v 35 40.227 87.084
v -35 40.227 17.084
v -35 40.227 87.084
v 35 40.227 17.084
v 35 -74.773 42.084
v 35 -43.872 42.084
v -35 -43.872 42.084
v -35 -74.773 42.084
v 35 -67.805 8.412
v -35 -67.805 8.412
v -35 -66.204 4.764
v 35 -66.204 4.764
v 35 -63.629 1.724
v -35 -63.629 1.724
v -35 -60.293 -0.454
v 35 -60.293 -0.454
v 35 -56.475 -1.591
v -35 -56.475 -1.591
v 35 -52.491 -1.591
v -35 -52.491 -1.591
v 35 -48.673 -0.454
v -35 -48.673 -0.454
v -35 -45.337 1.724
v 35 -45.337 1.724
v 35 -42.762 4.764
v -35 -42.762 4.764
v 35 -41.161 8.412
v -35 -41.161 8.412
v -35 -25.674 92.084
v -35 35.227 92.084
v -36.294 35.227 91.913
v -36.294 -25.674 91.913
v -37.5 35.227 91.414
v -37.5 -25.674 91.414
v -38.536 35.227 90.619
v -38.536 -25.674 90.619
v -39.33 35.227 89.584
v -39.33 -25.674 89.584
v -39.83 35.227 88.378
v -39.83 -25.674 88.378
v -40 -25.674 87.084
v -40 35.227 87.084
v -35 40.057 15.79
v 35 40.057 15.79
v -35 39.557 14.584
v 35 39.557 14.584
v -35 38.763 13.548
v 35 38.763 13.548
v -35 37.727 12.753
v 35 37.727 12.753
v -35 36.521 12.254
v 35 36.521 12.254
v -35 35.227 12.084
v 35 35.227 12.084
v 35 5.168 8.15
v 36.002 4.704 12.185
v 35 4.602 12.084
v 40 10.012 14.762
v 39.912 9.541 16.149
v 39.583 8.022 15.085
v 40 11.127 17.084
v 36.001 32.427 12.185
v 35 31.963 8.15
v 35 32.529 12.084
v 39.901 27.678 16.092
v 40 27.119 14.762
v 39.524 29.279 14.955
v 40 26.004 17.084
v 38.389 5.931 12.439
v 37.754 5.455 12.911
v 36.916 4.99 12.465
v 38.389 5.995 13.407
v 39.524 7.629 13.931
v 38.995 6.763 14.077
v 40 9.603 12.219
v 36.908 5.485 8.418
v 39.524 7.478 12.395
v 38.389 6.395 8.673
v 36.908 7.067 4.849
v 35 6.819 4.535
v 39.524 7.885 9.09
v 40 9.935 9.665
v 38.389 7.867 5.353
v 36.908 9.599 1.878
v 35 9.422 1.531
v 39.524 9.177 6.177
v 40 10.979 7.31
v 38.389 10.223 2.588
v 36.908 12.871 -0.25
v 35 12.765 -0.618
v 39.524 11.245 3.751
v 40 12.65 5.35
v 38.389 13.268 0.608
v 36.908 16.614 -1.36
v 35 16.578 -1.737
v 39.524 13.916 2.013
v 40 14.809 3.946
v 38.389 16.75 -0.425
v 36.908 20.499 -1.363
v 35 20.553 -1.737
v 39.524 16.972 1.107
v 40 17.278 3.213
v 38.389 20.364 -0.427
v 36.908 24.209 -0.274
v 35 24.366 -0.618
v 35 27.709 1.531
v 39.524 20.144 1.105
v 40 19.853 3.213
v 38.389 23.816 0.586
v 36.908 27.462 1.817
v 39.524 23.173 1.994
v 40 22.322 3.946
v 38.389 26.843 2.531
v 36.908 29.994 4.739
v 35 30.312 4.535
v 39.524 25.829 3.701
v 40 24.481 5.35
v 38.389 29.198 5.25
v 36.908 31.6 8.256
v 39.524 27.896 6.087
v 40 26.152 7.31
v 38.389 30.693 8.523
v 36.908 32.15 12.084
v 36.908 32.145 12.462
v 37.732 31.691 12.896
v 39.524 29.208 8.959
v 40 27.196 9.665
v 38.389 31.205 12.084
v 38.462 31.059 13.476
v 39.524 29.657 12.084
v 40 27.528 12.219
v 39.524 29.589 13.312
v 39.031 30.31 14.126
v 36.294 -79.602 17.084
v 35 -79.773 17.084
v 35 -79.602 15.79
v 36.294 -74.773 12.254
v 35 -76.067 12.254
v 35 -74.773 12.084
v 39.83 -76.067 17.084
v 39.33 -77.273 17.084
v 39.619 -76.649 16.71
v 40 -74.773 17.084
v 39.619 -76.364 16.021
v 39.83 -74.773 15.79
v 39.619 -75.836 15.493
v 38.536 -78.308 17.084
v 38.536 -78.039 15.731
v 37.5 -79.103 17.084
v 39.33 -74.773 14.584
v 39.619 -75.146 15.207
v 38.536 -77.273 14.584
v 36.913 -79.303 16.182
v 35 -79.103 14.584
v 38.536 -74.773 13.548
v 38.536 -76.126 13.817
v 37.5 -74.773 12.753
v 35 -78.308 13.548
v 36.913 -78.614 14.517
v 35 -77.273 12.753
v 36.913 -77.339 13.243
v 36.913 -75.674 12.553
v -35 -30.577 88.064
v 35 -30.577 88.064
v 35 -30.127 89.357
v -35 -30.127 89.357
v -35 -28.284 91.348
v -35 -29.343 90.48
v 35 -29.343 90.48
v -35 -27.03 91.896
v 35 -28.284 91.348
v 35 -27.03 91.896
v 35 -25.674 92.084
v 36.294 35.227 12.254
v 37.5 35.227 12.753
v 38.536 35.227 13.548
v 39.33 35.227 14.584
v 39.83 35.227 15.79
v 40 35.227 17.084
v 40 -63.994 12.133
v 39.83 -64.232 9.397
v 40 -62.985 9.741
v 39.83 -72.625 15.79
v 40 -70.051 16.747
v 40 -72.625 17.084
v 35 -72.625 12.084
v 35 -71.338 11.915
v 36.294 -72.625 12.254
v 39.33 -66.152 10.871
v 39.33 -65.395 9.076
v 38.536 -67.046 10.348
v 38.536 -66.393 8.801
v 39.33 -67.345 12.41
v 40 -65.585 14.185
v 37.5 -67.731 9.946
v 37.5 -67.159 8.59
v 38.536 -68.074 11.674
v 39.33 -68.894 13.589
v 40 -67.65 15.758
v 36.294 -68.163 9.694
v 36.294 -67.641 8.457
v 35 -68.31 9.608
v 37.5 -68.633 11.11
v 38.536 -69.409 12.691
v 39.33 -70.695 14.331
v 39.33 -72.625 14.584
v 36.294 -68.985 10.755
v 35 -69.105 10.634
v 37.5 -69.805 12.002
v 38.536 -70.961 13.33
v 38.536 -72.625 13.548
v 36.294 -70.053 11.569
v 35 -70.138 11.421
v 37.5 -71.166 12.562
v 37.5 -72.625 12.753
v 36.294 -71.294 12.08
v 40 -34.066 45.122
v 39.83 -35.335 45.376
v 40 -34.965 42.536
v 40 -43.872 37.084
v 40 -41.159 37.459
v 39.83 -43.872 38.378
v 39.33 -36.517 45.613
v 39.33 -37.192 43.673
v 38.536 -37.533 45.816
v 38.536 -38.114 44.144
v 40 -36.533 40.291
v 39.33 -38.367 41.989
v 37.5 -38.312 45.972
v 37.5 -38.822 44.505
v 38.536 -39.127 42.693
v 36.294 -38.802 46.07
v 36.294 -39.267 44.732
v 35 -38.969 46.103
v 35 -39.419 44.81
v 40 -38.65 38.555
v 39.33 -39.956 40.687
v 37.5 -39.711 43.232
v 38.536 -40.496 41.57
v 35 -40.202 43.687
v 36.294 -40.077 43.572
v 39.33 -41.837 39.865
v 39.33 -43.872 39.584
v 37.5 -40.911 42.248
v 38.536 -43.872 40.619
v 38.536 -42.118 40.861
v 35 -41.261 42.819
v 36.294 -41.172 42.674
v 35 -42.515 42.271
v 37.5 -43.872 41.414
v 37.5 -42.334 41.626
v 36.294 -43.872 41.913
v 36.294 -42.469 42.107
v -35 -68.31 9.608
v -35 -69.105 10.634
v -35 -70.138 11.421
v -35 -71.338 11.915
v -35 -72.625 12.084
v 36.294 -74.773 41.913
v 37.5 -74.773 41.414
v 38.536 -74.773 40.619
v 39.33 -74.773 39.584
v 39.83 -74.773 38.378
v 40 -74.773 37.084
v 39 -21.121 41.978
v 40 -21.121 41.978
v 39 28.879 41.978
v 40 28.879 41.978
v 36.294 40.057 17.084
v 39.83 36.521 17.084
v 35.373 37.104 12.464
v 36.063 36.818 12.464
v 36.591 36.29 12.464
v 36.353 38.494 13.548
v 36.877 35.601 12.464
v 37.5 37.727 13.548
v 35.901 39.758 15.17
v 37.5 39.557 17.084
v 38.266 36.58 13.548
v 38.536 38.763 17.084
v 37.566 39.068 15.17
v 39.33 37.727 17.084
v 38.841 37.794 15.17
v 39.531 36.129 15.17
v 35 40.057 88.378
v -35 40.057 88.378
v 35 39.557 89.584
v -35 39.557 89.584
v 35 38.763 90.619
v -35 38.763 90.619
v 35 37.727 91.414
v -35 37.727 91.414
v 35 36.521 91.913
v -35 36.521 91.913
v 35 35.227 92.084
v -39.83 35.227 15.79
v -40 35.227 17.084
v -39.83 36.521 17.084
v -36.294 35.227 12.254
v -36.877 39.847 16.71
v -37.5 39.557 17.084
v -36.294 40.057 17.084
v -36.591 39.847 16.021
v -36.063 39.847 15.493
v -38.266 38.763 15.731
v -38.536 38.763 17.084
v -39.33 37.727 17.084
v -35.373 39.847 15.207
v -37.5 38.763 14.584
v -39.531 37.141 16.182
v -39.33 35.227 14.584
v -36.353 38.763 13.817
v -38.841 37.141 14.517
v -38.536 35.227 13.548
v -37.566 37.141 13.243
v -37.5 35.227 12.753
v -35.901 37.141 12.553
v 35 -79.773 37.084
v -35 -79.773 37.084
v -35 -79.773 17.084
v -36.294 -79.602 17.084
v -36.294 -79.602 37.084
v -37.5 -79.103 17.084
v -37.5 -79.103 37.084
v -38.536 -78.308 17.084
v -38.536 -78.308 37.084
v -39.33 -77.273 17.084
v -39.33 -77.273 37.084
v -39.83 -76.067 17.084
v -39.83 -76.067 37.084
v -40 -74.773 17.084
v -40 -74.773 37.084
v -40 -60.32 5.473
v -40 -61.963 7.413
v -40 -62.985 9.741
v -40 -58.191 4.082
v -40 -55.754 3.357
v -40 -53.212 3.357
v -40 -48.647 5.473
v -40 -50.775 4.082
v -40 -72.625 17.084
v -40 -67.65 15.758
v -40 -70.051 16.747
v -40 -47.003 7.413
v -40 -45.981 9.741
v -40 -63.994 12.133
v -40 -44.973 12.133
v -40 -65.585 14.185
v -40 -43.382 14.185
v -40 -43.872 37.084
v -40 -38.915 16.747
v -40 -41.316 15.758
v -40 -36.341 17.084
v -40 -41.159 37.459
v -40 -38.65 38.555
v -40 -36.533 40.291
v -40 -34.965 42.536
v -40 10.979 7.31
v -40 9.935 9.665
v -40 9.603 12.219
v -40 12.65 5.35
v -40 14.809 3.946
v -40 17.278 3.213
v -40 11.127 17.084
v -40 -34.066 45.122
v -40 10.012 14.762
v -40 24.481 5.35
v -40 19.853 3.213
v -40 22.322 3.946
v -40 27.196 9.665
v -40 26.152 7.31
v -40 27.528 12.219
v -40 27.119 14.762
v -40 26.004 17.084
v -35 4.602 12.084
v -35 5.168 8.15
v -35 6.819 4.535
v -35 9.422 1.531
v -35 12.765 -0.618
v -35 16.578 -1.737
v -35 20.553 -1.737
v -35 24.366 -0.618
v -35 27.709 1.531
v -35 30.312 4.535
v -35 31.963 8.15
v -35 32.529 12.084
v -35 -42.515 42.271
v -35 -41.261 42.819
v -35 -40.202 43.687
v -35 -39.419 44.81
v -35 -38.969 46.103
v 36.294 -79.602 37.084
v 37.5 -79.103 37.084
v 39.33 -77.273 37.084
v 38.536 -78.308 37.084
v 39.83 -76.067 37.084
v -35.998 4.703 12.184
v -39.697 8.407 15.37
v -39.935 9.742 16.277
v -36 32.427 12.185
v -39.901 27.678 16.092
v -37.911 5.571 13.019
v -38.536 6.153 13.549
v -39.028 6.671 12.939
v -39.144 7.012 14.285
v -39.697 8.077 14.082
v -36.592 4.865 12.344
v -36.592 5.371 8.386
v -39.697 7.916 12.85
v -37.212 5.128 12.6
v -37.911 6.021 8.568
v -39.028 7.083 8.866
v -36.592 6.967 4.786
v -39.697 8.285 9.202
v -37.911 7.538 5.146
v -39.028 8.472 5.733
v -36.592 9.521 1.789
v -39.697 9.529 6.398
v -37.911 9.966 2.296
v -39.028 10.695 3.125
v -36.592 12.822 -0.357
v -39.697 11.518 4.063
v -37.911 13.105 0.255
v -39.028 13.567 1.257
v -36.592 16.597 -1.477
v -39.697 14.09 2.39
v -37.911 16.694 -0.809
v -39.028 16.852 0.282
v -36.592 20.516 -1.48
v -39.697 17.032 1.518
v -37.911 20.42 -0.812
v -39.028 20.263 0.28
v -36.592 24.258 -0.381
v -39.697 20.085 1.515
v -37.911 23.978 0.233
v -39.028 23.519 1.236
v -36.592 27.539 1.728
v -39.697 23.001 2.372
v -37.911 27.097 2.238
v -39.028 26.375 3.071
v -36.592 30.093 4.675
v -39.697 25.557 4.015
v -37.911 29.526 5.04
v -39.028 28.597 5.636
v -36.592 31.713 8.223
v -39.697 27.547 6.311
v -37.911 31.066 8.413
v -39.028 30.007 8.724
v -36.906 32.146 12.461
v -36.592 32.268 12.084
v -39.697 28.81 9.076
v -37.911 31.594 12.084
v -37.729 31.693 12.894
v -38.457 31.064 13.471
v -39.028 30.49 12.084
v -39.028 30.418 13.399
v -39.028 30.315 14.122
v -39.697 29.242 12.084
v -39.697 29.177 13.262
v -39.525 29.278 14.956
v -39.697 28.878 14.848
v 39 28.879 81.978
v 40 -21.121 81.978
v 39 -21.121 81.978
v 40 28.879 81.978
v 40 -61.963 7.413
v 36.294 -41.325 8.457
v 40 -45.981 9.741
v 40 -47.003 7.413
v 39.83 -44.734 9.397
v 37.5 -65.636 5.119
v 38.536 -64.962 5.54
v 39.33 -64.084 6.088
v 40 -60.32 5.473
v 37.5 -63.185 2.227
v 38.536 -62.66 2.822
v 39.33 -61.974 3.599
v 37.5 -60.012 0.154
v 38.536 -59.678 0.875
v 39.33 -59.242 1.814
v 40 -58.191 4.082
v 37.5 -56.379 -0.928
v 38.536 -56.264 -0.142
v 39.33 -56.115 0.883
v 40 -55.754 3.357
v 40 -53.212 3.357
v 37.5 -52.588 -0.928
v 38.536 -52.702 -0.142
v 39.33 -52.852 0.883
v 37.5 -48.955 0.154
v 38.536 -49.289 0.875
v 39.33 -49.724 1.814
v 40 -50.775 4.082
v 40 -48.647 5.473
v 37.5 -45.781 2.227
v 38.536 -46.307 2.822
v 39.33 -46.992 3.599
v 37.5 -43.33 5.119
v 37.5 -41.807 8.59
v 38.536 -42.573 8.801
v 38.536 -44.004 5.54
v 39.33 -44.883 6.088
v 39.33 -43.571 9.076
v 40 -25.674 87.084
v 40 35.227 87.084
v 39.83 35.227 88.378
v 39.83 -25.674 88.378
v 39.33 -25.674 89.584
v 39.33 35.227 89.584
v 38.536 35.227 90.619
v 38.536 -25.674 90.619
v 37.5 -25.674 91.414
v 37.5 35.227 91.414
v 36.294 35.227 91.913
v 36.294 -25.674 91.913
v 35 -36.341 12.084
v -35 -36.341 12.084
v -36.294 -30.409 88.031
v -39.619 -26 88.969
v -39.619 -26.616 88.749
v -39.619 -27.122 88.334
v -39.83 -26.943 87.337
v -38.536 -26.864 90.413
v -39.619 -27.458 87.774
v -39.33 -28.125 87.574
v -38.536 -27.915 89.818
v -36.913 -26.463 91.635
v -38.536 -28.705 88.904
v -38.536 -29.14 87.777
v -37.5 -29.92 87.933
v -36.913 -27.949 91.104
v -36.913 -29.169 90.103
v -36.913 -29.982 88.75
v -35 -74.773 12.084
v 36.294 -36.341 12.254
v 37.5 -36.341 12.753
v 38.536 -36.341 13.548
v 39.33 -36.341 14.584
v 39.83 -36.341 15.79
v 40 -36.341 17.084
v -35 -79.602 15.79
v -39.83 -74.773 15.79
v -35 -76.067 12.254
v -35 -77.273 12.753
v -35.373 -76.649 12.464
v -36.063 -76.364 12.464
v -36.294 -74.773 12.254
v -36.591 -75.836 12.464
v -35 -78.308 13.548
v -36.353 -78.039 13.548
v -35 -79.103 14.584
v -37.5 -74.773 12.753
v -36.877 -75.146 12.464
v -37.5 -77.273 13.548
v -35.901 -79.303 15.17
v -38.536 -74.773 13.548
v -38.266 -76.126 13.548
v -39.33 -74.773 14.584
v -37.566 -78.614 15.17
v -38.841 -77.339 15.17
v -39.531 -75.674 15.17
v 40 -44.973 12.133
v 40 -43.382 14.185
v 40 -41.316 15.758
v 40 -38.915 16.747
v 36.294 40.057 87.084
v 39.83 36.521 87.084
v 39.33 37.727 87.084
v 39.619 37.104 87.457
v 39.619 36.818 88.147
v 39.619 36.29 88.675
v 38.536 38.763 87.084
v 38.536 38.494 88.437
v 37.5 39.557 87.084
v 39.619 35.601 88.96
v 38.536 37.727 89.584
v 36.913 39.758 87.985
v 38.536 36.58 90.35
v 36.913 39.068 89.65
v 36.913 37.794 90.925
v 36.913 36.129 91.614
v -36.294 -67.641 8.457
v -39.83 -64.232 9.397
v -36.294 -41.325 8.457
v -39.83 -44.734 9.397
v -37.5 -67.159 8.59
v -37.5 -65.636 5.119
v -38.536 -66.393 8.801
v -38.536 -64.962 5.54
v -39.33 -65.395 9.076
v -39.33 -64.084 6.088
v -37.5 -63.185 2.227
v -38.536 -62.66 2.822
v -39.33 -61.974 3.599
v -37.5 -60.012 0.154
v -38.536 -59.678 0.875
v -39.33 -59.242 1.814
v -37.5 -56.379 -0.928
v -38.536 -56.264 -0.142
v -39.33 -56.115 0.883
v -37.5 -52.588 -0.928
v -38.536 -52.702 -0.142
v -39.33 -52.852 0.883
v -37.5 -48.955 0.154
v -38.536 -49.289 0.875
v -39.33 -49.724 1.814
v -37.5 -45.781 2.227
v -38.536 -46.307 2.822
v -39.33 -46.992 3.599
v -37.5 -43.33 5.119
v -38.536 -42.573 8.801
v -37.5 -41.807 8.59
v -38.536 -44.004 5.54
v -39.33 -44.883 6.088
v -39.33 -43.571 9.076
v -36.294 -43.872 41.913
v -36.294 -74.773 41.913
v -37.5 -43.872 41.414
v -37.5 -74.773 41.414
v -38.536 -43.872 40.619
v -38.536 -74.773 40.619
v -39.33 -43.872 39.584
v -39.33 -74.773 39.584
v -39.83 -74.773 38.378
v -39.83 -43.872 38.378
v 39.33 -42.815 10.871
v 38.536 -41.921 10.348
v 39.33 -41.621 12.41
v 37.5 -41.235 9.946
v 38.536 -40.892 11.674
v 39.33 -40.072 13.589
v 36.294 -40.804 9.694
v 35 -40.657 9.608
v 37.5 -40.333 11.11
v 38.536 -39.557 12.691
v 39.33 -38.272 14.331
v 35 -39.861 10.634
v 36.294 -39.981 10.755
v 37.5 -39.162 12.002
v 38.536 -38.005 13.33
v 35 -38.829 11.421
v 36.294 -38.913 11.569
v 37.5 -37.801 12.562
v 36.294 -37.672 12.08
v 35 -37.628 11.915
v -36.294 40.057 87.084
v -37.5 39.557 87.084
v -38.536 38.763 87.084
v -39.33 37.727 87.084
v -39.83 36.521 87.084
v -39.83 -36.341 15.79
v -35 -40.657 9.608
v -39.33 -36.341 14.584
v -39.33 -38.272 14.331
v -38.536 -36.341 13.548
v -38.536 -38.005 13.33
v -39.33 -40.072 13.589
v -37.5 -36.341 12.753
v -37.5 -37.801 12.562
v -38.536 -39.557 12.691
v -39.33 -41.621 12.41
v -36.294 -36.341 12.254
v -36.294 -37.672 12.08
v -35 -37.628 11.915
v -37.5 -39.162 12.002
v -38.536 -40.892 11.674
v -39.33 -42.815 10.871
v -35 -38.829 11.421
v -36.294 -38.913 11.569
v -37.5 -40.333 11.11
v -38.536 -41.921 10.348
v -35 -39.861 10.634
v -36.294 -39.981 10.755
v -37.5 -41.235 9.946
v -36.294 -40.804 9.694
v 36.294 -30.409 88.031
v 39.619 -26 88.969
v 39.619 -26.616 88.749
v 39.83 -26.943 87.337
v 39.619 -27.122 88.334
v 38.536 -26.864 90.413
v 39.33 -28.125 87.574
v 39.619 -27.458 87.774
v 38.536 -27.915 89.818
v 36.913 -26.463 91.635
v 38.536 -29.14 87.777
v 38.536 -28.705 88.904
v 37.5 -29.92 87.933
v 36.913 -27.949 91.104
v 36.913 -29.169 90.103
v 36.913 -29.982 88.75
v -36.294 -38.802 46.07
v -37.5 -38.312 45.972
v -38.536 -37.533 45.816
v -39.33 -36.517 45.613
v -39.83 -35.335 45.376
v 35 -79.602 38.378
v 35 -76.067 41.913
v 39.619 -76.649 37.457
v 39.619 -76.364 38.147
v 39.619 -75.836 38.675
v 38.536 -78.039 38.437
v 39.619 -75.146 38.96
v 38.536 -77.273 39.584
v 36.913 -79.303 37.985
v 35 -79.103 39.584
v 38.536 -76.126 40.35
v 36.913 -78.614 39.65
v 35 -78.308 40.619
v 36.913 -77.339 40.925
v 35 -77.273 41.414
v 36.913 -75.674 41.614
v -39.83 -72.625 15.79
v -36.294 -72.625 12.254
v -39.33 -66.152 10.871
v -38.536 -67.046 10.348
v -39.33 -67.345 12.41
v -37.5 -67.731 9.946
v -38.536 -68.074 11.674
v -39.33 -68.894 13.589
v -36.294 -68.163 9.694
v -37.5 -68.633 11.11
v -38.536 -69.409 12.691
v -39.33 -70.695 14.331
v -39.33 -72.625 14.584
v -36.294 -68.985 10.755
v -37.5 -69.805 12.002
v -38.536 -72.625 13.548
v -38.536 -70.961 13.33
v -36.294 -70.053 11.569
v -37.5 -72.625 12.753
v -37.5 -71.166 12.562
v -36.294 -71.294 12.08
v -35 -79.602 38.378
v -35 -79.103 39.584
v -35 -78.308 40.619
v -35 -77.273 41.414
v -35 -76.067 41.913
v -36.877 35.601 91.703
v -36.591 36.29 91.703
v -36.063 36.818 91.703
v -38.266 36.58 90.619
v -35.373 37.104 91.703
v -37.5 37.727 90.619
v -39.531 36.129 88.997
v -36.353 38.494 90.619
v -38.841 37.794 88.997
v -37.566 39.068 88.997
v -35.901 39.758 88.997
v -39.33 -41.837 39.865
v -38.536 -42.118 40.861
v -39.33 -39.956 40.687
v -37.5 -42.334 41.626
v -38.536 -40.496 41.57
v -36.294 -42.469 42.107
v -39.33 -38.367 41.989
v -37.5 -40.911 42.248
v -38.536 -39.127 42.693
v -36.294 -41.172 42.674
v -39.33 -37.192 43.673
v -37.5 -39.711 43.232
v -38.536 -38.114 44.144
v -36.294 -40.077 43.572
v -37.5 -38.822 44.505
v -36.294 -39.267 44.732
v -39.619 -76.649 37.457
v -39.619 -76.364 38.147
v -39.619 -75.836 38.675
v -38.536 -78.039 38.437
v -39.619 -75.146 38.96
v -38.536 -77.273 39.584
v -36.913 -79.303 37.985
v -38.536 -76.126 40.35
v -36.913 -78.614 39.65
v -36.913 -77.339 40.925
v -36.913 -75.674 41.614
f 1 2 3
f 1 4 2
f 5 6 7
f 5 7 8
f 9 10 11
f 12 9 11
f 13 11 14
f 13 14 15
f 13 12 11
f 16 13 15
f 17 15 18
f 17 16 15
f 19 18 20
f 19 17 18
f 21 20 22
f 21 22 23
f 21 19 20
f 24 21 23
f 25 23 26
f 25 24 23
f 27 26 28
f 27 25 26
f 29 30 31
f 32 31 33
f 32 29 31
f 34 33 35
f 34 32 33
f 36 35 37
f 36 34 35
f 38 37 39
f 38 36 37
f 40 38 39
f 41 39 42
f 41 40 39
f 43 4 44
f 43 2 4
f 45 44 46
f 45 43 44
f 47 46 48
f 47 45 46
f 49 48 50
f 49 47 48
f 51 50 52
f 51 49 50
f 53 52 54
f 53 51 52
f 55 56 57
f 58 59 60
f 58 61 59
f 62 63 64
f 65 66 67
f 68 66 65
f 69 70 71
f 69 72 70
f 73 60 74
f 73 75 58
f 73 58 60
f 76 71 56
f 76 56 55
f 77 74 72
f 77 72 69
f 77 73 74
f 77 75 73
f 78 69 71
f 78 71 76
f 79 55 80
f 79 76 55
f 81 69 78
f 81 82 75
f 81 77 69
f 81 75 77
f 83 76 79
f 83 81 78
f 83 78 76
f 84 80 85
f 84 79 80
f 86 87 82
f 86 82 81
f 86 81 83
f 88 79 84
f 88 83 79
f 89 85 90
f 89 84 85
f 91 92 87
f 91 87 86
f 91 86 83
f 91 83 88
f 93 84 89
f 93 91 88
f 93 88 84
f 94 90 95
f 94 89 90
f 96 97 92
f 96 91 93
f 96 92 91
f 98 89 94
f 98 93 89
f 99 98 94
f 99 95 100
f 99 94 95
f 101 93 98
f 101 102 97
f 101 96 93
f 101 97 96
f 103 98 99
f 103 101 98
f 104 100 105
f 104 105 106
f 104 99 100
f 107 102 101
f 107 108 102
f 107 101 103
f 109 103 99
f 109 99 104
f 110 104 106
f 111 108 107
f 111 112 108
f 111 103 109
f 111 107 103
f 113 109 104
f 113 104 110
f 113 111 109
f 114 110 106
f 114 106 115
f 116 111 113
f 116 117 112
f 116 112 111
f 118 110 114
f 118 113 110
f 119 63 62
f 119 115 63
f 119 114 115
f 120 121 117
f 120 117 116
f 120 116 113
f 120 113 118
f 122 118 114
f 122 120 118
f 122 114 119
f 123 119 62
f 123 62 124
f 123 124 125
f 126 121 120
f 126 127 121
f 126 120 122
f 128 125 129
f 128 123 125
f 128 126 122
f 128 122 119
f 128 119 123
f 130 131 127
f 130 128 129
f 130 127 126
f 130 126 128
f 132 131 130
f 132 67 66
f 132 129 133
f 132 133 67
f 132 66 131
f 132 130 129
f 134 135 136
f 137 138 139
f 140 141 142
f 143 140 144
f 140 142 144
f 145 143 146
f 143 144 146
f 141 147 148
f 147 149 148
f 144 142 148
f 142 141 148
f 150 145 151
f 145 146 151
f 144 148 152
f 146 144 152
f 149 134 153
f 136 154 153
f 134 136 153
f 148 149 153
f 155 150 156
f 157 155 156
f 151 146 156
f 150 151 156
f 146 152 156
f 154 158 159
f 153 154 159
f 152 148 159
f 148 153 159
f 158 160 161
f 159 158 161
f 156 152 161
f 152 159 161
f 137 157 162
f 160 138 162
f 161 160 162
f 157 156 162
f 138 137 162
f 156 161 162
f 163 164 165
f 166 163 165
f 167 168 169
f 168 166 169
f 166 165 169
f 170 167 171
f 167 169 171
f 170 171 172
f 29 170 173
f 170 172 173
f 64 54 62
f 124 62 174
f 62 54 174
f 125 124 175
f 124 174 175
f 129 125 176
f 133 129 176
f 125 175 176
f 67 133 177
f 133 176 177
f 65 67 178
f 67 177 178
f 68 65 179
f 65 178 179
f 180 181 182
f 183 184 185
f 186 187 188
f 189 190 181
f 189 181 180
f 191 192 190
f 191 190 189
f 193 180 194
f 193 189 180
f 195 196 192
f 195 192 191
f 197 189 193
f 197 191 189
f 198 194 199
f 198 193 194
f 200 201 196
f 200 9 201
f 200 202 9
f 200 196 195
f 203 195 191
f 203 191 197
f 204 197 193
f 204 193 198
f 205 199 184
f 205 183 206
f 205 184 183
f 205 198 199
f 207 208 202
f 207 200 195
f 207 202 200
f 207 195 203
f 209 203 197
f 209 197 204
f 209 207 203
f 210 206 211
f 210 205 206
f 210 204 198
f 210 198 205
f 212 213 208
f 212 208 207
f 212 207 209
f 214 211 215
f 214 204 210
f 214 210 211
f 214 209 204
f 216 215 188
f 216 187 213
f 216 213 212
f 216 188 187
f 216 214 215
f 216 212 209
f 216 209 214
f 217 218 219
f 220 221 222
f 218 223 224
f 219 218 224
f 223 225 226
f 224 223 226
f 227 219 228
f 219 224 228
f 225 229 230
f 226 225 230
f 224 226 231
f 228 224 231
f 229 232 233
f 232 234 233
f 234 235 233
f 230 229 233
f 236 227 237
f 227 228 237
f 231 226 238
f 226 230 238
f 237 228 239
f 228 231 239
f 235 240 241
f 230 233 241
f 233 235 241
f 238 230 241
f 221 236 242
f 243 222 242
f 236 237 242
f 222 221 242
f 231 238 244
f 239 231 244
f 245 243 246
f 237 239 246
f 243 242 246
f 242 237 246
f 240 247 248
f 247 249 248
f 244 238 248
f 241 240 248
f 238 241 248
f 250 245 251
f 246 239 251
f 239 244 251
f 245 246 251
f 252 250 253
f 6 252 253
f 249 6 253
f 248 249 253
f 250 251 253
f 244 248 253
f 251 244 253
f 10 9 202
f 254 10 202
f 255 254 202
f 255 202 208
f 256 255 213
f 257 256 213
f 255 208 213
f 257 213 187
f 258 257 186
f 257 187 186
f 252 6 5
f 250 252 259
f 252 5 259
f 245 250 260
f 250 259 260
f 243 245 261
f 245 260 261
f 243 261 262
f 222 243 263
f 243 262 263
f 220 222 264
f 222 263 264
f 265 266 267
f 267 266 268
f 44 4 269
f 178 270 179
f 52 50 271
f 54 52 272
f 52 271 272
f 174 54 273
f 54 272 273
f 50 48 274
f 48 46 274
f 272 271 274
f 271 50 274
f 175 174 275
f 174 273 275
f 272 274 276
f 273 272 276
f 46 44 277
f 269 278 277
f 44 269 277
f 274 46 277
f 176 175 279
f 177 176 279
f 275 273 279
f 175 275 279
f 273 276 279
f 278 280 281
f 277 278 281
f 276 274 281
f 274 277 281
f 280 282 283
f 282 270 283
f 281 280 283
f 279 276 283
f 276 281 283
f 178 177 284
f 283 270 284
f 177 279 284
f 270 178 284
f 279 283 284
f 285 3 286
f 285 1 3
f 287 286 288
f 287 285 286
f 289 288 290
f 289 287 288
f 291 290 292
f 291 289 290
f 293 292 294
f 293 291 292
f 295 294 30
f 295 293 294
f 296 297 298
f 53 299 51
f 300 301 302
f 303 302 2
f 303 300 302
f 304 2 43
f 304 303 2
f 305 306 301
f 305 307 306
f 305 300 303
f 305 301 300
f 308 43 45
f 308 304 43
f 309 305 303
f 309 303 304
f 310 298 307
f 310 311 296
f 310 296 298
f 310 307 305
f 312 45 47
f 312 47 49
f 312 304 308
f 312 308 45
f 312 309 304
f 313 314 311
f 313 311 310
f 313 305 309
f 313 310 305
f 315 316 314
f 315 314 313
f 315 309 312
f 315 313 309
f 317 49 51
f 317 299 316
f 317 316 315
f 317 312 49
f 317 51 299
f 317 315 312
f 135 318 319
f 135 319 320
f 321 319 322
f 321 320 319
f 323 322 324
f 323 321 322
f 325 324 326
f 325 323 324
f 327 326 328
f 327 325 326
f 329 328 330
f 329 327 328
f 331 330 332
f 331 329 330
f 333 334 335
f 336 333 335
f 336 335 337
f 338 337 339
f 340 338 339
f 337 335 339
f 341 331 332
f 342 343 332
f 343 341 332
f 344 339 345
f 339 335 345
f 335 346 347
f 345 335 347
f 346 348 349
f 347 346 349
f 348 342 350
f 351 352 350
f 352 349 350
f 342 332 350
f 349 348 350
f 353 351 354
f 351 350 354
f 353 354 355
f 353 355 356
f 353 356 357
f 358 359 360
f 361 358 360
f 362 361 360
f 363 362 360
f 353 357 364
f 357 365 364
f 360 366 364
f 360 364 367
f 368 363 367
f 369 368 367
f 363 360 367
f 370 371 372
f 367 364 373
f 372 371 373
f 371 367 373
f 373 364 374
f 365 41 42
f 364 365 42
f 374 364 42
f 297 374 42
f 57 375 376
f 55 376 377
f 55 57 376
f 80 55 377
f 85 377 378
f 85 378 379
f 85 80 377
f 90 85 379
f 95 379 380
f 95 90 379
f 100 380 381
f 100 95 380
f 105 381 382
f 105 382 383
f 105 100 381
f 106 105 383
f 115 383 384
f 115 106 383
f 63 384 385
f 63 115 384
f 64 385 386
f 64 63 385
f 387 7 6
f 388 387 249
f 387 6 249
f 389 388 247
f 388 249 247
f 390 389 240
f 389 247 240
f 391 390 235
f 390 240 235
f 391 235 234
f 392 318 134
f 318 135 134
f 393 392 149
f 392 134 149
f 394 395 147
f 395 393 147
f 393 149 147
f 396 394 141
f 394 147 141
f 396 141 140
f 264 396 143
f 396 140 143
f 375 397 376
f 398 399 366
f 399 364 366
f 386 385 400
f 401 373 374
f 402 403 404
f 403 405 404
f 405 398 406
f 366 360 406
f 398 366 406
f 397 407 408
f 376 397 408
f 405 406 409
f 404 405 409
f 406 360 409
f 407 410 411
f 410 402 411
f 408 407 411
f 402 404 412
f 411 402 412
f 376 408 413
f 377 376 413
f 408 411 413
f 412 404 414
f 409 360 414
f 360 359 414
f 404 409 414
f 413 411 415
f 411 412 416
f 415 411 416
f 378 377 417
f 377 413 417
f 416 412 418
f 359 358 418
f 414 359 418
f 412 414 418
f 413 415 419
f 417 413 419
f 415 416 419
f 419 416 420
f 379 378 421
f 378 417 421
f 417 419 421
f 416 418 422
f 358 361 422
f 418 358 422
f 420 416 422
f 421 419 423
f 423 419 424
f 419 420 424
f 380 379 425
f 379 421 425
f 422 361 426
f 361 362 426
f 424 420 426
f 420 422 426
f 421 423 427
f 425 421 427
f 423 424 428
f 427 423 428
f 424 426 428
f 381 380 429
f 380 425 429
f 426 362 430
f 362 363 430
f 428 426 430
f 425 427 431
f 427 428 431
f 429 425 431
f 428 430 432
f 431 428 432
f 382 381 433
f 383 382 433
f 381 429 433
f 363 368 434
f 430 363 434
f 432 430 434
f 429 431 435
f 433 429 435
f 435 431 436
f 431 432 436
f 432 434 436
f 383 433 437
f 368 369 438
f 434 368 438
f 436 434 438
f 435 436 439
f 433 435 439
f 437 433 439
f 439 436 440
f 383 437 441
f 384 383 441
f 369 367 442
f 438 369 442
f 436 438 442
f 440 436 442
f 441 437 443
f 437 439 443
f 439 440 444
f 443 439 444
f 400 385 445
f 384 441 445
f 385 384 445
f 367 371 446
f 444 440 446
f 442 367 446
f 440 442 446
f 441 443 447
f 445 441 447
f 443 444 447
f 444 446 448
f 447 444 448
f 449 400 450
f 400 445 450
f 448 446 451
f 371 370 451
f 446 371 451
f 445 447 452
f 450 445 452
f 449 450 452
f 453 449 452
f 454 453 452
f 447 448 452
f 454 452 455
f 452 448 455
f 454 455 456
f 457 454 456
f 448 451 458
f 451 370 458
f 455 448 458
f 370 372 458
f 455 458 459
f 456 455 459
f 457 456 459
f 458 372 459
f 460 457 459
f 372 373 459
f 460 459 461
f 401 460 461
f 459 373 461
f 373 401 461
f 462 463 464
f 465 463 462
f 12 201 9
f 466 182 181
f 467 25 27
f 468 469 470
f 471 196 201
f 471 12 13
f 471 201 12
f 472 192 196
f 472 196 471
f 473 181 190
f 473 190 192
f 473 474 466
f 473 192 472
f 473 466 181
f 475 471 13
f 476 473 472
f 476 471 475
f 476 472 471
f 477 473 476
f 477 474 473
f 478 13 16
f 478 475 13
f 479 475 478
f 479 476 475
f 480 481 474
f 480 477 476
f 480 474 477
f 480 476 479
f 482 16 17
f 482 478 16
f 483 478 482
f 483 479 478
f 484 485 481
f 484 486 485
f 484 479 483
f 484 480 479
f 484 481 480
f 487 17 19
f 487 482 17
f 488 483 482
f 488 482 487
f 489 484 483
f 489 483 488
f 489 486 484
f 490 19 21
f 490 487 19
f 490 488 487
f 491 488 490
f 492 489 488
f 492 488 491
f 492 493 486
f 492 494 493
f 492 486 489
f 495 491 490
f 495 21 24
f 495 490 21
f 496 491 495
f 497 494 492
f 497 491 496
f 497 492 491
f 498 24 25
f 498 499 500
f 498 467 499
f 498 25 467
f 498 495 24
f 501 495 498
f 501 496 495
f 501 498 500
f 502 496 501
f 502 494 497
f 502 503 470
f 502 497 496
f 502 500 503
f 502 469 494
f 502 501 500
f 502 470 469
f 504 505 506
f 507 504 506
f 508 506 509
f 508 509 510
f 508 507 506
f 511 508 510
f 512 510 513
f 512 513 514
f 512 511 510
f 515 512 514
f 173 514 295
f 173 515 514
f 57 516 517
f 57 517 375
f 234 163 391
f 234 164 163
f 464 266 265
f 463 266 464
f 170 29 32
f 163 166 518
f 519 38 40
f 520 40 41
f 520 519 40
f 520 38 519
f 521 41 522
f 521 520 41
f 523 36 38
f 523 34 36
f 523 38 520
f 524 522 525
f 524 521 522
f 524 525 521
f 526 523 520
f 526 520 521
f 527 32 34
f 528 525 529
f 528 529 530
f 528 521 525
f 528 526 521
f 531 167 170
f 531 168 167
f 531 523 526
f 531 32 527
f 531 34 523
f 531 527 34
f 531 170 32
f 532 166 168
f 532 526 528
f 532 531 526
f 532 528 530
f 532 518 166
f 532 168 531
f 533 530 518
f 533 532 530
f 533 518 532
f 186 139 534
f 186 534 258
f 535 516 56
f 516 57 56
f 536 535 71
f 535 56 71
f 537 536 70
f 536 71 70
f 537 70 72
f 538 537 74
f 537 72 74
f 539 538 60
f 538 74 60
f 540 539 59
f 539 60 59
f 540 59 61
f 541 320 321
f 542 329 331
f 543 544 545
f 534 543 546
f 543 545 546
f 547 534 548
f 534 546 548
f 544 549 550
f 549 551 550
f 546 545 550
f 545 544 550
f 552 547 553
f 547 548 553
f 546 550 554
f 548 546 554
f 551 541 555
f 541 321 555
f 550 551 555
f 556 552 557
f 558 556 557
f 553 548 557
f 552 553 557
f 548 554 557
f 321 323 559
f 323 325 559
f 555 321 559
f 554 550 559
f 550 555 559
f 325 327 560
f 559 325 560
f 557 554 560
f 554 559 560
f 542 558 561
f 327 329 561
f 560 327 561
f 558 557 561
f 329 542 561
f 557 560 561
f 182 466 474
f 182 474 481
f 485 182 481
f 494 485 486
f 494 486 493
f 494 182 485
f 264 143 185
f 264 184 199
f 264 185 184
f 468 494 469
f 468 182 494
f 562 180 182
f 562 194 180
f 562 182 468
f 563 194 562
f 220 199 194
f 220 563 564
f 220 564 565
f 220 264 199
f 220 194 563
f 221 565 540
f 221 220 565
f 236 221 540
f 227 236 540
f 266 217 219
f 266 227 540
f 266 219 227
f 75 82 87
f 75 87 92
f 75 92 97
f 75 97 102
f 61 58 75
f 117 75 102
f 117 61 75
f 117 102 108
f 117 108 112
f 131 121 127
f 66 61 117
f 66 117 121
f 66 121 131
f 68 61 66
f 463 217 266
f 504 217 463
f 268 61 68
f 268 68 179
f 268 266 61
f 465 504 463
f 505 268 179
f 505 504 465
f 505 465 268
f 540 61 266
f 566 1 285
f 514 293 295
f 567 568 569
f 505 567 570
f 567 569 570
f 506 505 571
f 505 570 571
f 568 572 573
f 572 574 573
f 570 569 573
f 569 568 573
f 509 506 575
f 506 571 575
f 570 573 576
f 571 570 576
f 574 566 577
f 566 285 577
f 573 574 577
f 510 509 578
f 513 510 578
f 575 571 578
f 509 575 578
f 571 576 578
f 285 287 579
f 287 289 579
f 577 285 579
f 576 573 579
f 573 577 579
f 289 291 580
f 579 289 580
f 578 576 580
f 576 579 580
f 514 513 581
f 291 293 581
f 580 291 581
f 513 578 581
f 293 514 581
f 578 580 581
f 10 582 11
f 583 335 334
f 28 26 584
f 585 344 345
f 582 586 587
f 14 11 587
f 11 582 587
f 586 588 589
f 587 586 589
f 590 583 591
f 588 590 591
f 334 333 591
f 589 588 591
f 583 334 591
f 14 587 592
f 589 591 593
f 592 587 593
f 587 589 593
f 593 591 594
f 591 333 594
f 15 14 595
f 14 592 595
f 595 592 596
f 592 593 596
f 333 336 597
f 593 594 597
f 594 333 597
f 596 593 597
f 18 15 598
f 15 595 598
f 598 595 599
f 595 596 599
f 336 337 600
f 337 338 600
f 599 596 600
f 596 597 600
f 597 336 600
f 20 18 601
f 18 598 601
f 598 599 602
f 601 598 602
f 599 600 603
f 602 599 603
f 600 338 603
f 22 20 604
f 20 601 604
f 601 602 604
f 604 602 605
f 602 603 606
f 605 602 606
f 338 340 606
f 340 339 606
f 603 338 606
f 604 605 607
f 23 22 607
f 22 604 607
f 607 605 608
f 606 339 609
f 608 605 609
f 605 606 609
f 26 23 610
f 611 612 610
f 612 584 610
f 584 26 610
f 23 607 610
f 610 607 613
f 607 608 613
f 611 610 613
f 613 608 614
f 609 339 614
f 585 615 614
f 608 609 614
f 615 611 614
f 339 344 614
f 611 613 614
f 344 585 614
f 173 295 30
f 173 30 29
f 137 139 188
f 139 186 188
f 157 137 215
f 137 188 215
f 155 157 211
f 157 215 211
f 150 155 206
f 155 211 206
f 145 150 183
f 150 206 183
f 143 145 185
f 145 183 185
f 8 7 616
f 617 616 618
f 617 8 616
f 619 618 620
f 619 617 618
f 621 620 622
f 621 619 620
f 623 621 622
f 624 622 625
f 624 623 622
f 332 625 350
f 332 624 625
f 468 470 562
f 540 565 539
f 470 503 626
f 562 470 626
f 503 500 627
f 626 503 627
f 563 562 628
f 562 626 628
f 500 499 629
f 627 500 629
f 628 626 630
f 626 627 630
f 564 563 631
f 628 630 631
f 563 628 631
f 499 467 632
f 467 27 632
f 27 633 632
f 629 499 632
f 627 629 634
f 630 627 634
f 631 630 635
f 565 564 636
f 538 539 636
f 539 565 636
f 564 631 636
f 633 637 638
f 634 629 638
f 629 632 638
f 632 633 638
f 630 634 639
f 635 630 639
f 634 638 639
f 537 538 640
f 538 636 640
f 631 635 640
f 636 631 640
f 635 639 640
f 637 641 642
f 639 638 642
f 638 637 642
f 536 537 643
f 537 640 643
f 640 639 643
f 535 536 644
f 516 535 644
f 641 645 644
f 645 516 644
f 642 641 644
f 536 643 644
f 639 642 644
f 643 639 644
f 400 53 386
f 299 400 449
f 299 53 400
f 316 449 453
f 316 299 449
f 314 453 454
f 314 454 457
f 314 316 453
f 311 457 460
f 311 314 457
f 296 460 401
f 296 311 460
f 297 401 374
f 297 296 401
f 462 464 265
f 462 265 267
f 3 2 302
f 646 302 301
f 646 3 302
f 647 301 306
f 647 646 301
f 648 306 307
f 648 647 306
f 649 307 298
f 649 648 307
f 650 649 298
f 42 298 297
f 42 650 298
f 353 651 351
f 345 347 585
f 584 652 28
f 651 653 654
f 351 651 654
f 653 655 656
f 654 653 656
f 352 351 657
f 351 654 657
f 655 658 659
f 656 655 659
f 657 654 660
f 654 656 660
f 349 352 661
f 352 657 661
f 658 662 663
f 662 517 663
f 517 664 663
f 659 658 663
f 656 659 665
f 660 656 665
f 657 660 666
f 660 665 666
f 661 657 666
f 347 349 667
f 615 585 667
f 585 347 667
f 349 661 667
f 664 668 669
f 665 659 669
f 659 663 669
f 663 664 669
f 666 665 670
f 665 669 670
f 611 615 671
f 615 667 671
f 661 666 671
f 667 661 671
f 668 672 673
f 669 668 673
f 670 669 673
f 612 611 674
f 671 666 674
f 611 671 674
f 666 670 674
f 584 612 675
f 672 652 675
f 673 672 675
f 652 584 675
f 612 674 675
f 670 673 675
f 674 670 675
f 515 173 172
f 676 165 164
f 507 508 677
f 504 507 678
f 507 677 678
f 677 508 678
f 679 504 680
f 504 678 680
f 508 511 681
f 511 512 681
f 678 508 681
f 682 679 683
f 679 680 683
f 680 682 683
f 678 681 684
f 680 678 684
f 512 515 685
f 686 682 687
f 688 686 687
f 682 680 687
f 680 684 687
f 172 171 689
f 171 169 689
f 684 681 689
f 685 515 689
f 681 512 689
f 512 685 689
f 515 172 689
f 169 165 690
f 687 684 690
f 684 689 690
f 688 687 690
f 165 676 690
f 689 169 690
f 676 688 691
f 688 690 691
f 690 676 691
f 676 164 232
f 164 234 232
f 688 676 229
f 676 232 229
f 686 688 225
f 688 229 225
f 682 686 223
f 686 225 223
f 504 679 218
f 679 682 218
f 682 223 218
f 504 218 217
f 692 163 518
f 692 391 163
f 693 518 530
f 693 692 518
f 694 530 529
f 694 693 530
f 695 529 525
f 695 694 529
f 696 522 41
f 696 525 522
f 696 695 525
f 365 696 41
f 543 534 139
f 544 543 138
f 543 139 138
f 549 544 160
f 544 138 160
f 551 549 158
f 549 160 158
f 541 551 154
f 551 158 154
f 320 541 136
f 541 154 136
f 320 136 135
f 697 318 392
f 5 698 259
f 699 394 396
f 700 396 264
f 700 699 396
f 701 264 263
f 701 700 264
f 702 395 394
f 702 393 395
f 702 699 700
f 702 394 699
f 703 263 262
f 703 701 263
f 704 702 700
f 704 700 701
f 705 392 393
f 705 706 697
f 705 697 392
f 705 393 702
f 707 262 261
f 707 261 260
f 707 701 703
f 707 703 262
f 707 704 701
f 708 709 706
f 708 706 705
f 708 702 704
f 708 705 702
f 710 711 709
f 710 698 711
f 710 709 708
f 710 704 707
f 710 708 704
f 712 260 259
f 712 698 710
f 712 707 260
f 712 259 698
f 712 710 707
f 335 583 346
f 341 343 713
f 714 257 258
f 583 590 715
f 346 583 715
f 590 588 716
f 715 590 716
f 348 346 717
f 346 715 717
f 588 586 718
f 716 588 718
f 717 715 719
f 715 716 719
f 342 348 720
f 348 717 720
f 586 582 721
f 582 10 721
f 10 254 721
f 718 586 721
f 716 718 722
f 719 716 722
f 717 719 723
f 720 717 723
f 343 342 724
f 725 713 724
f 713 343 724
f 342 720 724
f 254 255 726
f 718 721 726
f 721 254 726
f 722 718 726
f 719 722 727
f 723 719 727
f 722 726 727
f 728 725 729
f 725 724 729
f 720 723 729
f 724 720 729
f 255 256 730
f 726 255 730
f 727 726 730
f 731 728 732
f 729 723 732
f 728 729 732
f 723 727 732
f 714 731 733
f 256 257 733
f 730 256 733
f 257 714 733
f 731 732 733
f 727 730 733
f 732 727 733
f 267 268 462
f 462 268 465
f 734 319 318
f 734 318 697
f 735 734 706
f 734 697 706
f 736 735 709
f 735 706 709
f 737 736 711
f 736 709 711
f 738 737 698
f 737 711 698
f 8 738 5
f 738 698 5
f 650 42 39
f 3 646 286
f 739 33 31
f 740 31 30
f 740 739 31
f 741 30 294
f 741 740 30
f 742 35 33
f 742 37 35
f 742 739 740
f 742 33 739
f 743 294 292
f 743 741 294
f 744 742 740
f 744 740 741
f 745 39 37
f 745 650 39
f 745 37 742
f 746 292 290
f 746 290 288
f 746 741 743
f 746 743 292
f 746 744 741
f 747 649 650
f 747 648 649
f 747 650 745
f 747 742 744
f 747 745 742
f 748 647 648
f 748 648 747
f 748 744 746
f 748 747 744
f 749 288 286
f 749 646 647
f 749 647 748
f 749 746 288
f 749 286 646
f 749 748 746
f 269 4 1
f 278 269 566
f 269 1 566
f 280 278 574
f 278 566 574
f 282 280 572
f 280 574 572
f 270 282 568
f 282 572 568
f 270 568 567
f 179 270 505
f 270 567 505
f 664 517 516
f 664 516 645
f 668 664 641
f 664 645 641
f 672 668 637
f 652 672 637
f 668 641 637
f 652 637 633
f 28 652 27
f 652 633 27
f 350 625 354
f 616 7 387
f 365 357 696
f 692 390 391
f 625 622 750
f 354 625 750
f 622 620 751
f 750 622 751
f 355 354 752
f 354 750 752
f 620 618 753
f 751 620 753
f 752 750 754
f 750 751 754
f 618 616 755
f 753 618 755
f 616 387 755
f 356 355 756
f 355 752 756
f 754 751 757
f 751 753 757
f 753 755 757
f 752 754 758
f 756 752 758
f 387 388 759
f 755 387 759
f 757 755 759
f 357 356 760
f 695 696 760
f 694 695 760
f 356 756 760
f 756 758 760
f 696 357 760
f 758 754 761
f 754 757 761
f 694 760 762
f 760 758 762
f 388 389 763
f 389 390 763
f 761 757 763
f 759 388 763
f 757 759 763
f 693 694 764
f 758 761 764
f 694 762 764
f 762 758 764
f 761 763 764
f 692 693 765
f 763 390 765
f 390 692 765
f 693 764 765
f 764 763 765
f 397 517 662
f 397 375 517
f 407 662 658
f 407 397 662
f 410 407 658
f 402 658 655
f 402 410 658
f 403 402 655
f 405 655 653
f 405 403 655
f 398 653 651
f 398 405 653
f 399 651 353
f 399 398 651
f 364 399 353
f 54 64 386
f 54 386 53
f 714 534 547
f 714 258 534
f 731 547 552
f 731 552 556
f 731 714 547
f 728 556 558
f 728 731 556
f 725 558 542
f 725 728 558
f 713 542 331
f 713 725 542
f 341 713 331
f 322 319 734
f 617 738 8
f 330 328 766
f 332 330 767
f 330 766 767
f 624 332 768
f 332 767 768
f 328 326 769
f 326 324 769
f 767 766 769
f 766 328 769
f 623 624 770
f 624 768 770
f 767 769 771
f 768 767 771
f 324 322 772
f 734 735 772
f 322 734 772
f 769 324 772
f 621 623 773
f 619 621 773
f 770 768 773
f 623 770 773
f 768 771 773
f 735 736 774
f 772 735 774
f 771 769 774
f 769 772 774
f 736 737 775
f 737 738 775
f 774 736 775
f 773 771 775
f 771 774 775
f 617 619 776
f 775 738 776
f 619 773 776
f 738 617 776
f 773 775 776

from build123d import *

# Parameters (mm, degrees)
F1_DEPTH = 40
F2_R     = 5
F3_W     = 50
F3_H     = 40
F4_DEPTH = 1


with BuildPart() as f1:
    # F0 (on Right) → F1 (new body, symmetric)
    with BuildSketch(Plane.YZ):
        with BuildLine():
            ThreePointArc((4.6023512578, 12.0836236967), (18.5654944992, 26.0467669382), (32.5286377407, 12.0836236967))
            Line((32.5286377407, 12.0836236967), (40.2273690835, 12.0836236967))
            Line((40.2273690835, 12.0836236967), (40.2273690835, 92.0836236967))
            Line((40.2273690835, 92.0836236967), (-29.7726309165, 92.0836236967))
            Line((-29.7726309165, 92.0836236967), (-39.7726309165, 42.0836236967))
            Line((-39.7726309165, 42.0836236967), (-79.7726309165, 42.0836236967))
            Line((-79.7726309165, 42.0836236967), (-79.7726309165, 12.0836236967))
            Line((-79.7726309165, 12.0836236967), (-68.3018244008, 12.0836236967))
            ThreePointArc((-68.3018244008, 12.0836236967), (-54.4831605593, 25.9022875381), (-40.6644967179, 12.0836236967))
            Line((-40.6644967179, 12.0836236967), (4.6023512578, 12.0836236967))
        make_face()
        with BuildLine():
            Line((-68.3018244008, 12.0836236967), (-40.6644967179, 12.0836236967))
            ThreePointArc((-40.6644967179, 12.0836236967), (-54.4831605593, 25.9022875381), (-68.3018244008, 12.0836236967))
        make_face()
        with BuildLine():
            ThreePointArc((-68.3018244008, 12.0836236967), (-54.4831605593, -1.7350401447), (-40.6644967179, 12.0836236967))
            Line((-40.6644967179, 12.0836236967), (-68.3018244008, 12.0836236967))
        make_face()
        with BuildLine():
            Line((4.6023512578, 12.0836236967), (32.5286377407, 12.0836236967))
            ThreePointArc((32.5286377407, 12.0836236967), (18.5654944992, 26.0467669382), (4.6023512578, 12.0836236967))
        make_face()
        with BuildLine():
            ThreePointArc((4.6023512578, 12.0836236967), (18.5654944992, -1.8795195447), (32.5286377407, 12.0836236967))
            Line((32.5286377407, 12.0836236967), (4.6023512578, 12.0836236967))
        make_face()
    extrude(amount=F1_DEPTH, both=True)

    # F2
    f2_edges = [f1.edges().sort_by_distance(p)[0] for p in [
        (-40, -34.772631, 67.083624),
        (0, -39.772631, 42.083624),
        (40, -34.772631, 67.083624),
        (0, -29.772631, 92.083624),
        (0, -79.772631, 42.083624),
        (-40, -79.772631, 27.083624),
        (0, -79.772631, 12.083624),
        (40, -79.772631, 27.083624),
        (0, -68.301824, 12.083624),
        (-40, -54.483161, -1.73504),
        (0, -40.664497, 12.083624),
        (40, -54.483161, -1.73504),
        (-40, -59.772631, 42.083624),
        (-40, -74.037228, 12.083624),
        (-40, -18.031073, 12.083624),
        (-40, 18.565494, -1.87952),
        (-40, 36.378003, 12.083624),
        (-40, 40.227369, 52.083624),
        (-40, 5.227369, 92.083624),
        (0, 40.227369, 92.083624),
        (40, 40.227369, 52.083624),
        (0, 40.227369, 12.083624),
        (40, -59.772631, 42.083624),
        (40, -74.037228, 12.083624),
        (40, -18.031073, 12.083624),
        (40, 18.565494, -1.87952),
        (40, 36.378003, 12.083624),
        (40, 5.227369, 92.083624),
    ]]
    fillet(f2_edges, radius=F2_R)

    # F3 (on face) → F4 (cut, symmetric)
    with BuildSketch(Plane.YZ.offset(40)):
        with Locations((3.8793236017, 61.9780325047)):
            Rectangle(F3_W, F3_H)
    extrude(amount=F4_DEPTH, both=True, mode=Mode.SUBTRACT)


solid = f1.part
